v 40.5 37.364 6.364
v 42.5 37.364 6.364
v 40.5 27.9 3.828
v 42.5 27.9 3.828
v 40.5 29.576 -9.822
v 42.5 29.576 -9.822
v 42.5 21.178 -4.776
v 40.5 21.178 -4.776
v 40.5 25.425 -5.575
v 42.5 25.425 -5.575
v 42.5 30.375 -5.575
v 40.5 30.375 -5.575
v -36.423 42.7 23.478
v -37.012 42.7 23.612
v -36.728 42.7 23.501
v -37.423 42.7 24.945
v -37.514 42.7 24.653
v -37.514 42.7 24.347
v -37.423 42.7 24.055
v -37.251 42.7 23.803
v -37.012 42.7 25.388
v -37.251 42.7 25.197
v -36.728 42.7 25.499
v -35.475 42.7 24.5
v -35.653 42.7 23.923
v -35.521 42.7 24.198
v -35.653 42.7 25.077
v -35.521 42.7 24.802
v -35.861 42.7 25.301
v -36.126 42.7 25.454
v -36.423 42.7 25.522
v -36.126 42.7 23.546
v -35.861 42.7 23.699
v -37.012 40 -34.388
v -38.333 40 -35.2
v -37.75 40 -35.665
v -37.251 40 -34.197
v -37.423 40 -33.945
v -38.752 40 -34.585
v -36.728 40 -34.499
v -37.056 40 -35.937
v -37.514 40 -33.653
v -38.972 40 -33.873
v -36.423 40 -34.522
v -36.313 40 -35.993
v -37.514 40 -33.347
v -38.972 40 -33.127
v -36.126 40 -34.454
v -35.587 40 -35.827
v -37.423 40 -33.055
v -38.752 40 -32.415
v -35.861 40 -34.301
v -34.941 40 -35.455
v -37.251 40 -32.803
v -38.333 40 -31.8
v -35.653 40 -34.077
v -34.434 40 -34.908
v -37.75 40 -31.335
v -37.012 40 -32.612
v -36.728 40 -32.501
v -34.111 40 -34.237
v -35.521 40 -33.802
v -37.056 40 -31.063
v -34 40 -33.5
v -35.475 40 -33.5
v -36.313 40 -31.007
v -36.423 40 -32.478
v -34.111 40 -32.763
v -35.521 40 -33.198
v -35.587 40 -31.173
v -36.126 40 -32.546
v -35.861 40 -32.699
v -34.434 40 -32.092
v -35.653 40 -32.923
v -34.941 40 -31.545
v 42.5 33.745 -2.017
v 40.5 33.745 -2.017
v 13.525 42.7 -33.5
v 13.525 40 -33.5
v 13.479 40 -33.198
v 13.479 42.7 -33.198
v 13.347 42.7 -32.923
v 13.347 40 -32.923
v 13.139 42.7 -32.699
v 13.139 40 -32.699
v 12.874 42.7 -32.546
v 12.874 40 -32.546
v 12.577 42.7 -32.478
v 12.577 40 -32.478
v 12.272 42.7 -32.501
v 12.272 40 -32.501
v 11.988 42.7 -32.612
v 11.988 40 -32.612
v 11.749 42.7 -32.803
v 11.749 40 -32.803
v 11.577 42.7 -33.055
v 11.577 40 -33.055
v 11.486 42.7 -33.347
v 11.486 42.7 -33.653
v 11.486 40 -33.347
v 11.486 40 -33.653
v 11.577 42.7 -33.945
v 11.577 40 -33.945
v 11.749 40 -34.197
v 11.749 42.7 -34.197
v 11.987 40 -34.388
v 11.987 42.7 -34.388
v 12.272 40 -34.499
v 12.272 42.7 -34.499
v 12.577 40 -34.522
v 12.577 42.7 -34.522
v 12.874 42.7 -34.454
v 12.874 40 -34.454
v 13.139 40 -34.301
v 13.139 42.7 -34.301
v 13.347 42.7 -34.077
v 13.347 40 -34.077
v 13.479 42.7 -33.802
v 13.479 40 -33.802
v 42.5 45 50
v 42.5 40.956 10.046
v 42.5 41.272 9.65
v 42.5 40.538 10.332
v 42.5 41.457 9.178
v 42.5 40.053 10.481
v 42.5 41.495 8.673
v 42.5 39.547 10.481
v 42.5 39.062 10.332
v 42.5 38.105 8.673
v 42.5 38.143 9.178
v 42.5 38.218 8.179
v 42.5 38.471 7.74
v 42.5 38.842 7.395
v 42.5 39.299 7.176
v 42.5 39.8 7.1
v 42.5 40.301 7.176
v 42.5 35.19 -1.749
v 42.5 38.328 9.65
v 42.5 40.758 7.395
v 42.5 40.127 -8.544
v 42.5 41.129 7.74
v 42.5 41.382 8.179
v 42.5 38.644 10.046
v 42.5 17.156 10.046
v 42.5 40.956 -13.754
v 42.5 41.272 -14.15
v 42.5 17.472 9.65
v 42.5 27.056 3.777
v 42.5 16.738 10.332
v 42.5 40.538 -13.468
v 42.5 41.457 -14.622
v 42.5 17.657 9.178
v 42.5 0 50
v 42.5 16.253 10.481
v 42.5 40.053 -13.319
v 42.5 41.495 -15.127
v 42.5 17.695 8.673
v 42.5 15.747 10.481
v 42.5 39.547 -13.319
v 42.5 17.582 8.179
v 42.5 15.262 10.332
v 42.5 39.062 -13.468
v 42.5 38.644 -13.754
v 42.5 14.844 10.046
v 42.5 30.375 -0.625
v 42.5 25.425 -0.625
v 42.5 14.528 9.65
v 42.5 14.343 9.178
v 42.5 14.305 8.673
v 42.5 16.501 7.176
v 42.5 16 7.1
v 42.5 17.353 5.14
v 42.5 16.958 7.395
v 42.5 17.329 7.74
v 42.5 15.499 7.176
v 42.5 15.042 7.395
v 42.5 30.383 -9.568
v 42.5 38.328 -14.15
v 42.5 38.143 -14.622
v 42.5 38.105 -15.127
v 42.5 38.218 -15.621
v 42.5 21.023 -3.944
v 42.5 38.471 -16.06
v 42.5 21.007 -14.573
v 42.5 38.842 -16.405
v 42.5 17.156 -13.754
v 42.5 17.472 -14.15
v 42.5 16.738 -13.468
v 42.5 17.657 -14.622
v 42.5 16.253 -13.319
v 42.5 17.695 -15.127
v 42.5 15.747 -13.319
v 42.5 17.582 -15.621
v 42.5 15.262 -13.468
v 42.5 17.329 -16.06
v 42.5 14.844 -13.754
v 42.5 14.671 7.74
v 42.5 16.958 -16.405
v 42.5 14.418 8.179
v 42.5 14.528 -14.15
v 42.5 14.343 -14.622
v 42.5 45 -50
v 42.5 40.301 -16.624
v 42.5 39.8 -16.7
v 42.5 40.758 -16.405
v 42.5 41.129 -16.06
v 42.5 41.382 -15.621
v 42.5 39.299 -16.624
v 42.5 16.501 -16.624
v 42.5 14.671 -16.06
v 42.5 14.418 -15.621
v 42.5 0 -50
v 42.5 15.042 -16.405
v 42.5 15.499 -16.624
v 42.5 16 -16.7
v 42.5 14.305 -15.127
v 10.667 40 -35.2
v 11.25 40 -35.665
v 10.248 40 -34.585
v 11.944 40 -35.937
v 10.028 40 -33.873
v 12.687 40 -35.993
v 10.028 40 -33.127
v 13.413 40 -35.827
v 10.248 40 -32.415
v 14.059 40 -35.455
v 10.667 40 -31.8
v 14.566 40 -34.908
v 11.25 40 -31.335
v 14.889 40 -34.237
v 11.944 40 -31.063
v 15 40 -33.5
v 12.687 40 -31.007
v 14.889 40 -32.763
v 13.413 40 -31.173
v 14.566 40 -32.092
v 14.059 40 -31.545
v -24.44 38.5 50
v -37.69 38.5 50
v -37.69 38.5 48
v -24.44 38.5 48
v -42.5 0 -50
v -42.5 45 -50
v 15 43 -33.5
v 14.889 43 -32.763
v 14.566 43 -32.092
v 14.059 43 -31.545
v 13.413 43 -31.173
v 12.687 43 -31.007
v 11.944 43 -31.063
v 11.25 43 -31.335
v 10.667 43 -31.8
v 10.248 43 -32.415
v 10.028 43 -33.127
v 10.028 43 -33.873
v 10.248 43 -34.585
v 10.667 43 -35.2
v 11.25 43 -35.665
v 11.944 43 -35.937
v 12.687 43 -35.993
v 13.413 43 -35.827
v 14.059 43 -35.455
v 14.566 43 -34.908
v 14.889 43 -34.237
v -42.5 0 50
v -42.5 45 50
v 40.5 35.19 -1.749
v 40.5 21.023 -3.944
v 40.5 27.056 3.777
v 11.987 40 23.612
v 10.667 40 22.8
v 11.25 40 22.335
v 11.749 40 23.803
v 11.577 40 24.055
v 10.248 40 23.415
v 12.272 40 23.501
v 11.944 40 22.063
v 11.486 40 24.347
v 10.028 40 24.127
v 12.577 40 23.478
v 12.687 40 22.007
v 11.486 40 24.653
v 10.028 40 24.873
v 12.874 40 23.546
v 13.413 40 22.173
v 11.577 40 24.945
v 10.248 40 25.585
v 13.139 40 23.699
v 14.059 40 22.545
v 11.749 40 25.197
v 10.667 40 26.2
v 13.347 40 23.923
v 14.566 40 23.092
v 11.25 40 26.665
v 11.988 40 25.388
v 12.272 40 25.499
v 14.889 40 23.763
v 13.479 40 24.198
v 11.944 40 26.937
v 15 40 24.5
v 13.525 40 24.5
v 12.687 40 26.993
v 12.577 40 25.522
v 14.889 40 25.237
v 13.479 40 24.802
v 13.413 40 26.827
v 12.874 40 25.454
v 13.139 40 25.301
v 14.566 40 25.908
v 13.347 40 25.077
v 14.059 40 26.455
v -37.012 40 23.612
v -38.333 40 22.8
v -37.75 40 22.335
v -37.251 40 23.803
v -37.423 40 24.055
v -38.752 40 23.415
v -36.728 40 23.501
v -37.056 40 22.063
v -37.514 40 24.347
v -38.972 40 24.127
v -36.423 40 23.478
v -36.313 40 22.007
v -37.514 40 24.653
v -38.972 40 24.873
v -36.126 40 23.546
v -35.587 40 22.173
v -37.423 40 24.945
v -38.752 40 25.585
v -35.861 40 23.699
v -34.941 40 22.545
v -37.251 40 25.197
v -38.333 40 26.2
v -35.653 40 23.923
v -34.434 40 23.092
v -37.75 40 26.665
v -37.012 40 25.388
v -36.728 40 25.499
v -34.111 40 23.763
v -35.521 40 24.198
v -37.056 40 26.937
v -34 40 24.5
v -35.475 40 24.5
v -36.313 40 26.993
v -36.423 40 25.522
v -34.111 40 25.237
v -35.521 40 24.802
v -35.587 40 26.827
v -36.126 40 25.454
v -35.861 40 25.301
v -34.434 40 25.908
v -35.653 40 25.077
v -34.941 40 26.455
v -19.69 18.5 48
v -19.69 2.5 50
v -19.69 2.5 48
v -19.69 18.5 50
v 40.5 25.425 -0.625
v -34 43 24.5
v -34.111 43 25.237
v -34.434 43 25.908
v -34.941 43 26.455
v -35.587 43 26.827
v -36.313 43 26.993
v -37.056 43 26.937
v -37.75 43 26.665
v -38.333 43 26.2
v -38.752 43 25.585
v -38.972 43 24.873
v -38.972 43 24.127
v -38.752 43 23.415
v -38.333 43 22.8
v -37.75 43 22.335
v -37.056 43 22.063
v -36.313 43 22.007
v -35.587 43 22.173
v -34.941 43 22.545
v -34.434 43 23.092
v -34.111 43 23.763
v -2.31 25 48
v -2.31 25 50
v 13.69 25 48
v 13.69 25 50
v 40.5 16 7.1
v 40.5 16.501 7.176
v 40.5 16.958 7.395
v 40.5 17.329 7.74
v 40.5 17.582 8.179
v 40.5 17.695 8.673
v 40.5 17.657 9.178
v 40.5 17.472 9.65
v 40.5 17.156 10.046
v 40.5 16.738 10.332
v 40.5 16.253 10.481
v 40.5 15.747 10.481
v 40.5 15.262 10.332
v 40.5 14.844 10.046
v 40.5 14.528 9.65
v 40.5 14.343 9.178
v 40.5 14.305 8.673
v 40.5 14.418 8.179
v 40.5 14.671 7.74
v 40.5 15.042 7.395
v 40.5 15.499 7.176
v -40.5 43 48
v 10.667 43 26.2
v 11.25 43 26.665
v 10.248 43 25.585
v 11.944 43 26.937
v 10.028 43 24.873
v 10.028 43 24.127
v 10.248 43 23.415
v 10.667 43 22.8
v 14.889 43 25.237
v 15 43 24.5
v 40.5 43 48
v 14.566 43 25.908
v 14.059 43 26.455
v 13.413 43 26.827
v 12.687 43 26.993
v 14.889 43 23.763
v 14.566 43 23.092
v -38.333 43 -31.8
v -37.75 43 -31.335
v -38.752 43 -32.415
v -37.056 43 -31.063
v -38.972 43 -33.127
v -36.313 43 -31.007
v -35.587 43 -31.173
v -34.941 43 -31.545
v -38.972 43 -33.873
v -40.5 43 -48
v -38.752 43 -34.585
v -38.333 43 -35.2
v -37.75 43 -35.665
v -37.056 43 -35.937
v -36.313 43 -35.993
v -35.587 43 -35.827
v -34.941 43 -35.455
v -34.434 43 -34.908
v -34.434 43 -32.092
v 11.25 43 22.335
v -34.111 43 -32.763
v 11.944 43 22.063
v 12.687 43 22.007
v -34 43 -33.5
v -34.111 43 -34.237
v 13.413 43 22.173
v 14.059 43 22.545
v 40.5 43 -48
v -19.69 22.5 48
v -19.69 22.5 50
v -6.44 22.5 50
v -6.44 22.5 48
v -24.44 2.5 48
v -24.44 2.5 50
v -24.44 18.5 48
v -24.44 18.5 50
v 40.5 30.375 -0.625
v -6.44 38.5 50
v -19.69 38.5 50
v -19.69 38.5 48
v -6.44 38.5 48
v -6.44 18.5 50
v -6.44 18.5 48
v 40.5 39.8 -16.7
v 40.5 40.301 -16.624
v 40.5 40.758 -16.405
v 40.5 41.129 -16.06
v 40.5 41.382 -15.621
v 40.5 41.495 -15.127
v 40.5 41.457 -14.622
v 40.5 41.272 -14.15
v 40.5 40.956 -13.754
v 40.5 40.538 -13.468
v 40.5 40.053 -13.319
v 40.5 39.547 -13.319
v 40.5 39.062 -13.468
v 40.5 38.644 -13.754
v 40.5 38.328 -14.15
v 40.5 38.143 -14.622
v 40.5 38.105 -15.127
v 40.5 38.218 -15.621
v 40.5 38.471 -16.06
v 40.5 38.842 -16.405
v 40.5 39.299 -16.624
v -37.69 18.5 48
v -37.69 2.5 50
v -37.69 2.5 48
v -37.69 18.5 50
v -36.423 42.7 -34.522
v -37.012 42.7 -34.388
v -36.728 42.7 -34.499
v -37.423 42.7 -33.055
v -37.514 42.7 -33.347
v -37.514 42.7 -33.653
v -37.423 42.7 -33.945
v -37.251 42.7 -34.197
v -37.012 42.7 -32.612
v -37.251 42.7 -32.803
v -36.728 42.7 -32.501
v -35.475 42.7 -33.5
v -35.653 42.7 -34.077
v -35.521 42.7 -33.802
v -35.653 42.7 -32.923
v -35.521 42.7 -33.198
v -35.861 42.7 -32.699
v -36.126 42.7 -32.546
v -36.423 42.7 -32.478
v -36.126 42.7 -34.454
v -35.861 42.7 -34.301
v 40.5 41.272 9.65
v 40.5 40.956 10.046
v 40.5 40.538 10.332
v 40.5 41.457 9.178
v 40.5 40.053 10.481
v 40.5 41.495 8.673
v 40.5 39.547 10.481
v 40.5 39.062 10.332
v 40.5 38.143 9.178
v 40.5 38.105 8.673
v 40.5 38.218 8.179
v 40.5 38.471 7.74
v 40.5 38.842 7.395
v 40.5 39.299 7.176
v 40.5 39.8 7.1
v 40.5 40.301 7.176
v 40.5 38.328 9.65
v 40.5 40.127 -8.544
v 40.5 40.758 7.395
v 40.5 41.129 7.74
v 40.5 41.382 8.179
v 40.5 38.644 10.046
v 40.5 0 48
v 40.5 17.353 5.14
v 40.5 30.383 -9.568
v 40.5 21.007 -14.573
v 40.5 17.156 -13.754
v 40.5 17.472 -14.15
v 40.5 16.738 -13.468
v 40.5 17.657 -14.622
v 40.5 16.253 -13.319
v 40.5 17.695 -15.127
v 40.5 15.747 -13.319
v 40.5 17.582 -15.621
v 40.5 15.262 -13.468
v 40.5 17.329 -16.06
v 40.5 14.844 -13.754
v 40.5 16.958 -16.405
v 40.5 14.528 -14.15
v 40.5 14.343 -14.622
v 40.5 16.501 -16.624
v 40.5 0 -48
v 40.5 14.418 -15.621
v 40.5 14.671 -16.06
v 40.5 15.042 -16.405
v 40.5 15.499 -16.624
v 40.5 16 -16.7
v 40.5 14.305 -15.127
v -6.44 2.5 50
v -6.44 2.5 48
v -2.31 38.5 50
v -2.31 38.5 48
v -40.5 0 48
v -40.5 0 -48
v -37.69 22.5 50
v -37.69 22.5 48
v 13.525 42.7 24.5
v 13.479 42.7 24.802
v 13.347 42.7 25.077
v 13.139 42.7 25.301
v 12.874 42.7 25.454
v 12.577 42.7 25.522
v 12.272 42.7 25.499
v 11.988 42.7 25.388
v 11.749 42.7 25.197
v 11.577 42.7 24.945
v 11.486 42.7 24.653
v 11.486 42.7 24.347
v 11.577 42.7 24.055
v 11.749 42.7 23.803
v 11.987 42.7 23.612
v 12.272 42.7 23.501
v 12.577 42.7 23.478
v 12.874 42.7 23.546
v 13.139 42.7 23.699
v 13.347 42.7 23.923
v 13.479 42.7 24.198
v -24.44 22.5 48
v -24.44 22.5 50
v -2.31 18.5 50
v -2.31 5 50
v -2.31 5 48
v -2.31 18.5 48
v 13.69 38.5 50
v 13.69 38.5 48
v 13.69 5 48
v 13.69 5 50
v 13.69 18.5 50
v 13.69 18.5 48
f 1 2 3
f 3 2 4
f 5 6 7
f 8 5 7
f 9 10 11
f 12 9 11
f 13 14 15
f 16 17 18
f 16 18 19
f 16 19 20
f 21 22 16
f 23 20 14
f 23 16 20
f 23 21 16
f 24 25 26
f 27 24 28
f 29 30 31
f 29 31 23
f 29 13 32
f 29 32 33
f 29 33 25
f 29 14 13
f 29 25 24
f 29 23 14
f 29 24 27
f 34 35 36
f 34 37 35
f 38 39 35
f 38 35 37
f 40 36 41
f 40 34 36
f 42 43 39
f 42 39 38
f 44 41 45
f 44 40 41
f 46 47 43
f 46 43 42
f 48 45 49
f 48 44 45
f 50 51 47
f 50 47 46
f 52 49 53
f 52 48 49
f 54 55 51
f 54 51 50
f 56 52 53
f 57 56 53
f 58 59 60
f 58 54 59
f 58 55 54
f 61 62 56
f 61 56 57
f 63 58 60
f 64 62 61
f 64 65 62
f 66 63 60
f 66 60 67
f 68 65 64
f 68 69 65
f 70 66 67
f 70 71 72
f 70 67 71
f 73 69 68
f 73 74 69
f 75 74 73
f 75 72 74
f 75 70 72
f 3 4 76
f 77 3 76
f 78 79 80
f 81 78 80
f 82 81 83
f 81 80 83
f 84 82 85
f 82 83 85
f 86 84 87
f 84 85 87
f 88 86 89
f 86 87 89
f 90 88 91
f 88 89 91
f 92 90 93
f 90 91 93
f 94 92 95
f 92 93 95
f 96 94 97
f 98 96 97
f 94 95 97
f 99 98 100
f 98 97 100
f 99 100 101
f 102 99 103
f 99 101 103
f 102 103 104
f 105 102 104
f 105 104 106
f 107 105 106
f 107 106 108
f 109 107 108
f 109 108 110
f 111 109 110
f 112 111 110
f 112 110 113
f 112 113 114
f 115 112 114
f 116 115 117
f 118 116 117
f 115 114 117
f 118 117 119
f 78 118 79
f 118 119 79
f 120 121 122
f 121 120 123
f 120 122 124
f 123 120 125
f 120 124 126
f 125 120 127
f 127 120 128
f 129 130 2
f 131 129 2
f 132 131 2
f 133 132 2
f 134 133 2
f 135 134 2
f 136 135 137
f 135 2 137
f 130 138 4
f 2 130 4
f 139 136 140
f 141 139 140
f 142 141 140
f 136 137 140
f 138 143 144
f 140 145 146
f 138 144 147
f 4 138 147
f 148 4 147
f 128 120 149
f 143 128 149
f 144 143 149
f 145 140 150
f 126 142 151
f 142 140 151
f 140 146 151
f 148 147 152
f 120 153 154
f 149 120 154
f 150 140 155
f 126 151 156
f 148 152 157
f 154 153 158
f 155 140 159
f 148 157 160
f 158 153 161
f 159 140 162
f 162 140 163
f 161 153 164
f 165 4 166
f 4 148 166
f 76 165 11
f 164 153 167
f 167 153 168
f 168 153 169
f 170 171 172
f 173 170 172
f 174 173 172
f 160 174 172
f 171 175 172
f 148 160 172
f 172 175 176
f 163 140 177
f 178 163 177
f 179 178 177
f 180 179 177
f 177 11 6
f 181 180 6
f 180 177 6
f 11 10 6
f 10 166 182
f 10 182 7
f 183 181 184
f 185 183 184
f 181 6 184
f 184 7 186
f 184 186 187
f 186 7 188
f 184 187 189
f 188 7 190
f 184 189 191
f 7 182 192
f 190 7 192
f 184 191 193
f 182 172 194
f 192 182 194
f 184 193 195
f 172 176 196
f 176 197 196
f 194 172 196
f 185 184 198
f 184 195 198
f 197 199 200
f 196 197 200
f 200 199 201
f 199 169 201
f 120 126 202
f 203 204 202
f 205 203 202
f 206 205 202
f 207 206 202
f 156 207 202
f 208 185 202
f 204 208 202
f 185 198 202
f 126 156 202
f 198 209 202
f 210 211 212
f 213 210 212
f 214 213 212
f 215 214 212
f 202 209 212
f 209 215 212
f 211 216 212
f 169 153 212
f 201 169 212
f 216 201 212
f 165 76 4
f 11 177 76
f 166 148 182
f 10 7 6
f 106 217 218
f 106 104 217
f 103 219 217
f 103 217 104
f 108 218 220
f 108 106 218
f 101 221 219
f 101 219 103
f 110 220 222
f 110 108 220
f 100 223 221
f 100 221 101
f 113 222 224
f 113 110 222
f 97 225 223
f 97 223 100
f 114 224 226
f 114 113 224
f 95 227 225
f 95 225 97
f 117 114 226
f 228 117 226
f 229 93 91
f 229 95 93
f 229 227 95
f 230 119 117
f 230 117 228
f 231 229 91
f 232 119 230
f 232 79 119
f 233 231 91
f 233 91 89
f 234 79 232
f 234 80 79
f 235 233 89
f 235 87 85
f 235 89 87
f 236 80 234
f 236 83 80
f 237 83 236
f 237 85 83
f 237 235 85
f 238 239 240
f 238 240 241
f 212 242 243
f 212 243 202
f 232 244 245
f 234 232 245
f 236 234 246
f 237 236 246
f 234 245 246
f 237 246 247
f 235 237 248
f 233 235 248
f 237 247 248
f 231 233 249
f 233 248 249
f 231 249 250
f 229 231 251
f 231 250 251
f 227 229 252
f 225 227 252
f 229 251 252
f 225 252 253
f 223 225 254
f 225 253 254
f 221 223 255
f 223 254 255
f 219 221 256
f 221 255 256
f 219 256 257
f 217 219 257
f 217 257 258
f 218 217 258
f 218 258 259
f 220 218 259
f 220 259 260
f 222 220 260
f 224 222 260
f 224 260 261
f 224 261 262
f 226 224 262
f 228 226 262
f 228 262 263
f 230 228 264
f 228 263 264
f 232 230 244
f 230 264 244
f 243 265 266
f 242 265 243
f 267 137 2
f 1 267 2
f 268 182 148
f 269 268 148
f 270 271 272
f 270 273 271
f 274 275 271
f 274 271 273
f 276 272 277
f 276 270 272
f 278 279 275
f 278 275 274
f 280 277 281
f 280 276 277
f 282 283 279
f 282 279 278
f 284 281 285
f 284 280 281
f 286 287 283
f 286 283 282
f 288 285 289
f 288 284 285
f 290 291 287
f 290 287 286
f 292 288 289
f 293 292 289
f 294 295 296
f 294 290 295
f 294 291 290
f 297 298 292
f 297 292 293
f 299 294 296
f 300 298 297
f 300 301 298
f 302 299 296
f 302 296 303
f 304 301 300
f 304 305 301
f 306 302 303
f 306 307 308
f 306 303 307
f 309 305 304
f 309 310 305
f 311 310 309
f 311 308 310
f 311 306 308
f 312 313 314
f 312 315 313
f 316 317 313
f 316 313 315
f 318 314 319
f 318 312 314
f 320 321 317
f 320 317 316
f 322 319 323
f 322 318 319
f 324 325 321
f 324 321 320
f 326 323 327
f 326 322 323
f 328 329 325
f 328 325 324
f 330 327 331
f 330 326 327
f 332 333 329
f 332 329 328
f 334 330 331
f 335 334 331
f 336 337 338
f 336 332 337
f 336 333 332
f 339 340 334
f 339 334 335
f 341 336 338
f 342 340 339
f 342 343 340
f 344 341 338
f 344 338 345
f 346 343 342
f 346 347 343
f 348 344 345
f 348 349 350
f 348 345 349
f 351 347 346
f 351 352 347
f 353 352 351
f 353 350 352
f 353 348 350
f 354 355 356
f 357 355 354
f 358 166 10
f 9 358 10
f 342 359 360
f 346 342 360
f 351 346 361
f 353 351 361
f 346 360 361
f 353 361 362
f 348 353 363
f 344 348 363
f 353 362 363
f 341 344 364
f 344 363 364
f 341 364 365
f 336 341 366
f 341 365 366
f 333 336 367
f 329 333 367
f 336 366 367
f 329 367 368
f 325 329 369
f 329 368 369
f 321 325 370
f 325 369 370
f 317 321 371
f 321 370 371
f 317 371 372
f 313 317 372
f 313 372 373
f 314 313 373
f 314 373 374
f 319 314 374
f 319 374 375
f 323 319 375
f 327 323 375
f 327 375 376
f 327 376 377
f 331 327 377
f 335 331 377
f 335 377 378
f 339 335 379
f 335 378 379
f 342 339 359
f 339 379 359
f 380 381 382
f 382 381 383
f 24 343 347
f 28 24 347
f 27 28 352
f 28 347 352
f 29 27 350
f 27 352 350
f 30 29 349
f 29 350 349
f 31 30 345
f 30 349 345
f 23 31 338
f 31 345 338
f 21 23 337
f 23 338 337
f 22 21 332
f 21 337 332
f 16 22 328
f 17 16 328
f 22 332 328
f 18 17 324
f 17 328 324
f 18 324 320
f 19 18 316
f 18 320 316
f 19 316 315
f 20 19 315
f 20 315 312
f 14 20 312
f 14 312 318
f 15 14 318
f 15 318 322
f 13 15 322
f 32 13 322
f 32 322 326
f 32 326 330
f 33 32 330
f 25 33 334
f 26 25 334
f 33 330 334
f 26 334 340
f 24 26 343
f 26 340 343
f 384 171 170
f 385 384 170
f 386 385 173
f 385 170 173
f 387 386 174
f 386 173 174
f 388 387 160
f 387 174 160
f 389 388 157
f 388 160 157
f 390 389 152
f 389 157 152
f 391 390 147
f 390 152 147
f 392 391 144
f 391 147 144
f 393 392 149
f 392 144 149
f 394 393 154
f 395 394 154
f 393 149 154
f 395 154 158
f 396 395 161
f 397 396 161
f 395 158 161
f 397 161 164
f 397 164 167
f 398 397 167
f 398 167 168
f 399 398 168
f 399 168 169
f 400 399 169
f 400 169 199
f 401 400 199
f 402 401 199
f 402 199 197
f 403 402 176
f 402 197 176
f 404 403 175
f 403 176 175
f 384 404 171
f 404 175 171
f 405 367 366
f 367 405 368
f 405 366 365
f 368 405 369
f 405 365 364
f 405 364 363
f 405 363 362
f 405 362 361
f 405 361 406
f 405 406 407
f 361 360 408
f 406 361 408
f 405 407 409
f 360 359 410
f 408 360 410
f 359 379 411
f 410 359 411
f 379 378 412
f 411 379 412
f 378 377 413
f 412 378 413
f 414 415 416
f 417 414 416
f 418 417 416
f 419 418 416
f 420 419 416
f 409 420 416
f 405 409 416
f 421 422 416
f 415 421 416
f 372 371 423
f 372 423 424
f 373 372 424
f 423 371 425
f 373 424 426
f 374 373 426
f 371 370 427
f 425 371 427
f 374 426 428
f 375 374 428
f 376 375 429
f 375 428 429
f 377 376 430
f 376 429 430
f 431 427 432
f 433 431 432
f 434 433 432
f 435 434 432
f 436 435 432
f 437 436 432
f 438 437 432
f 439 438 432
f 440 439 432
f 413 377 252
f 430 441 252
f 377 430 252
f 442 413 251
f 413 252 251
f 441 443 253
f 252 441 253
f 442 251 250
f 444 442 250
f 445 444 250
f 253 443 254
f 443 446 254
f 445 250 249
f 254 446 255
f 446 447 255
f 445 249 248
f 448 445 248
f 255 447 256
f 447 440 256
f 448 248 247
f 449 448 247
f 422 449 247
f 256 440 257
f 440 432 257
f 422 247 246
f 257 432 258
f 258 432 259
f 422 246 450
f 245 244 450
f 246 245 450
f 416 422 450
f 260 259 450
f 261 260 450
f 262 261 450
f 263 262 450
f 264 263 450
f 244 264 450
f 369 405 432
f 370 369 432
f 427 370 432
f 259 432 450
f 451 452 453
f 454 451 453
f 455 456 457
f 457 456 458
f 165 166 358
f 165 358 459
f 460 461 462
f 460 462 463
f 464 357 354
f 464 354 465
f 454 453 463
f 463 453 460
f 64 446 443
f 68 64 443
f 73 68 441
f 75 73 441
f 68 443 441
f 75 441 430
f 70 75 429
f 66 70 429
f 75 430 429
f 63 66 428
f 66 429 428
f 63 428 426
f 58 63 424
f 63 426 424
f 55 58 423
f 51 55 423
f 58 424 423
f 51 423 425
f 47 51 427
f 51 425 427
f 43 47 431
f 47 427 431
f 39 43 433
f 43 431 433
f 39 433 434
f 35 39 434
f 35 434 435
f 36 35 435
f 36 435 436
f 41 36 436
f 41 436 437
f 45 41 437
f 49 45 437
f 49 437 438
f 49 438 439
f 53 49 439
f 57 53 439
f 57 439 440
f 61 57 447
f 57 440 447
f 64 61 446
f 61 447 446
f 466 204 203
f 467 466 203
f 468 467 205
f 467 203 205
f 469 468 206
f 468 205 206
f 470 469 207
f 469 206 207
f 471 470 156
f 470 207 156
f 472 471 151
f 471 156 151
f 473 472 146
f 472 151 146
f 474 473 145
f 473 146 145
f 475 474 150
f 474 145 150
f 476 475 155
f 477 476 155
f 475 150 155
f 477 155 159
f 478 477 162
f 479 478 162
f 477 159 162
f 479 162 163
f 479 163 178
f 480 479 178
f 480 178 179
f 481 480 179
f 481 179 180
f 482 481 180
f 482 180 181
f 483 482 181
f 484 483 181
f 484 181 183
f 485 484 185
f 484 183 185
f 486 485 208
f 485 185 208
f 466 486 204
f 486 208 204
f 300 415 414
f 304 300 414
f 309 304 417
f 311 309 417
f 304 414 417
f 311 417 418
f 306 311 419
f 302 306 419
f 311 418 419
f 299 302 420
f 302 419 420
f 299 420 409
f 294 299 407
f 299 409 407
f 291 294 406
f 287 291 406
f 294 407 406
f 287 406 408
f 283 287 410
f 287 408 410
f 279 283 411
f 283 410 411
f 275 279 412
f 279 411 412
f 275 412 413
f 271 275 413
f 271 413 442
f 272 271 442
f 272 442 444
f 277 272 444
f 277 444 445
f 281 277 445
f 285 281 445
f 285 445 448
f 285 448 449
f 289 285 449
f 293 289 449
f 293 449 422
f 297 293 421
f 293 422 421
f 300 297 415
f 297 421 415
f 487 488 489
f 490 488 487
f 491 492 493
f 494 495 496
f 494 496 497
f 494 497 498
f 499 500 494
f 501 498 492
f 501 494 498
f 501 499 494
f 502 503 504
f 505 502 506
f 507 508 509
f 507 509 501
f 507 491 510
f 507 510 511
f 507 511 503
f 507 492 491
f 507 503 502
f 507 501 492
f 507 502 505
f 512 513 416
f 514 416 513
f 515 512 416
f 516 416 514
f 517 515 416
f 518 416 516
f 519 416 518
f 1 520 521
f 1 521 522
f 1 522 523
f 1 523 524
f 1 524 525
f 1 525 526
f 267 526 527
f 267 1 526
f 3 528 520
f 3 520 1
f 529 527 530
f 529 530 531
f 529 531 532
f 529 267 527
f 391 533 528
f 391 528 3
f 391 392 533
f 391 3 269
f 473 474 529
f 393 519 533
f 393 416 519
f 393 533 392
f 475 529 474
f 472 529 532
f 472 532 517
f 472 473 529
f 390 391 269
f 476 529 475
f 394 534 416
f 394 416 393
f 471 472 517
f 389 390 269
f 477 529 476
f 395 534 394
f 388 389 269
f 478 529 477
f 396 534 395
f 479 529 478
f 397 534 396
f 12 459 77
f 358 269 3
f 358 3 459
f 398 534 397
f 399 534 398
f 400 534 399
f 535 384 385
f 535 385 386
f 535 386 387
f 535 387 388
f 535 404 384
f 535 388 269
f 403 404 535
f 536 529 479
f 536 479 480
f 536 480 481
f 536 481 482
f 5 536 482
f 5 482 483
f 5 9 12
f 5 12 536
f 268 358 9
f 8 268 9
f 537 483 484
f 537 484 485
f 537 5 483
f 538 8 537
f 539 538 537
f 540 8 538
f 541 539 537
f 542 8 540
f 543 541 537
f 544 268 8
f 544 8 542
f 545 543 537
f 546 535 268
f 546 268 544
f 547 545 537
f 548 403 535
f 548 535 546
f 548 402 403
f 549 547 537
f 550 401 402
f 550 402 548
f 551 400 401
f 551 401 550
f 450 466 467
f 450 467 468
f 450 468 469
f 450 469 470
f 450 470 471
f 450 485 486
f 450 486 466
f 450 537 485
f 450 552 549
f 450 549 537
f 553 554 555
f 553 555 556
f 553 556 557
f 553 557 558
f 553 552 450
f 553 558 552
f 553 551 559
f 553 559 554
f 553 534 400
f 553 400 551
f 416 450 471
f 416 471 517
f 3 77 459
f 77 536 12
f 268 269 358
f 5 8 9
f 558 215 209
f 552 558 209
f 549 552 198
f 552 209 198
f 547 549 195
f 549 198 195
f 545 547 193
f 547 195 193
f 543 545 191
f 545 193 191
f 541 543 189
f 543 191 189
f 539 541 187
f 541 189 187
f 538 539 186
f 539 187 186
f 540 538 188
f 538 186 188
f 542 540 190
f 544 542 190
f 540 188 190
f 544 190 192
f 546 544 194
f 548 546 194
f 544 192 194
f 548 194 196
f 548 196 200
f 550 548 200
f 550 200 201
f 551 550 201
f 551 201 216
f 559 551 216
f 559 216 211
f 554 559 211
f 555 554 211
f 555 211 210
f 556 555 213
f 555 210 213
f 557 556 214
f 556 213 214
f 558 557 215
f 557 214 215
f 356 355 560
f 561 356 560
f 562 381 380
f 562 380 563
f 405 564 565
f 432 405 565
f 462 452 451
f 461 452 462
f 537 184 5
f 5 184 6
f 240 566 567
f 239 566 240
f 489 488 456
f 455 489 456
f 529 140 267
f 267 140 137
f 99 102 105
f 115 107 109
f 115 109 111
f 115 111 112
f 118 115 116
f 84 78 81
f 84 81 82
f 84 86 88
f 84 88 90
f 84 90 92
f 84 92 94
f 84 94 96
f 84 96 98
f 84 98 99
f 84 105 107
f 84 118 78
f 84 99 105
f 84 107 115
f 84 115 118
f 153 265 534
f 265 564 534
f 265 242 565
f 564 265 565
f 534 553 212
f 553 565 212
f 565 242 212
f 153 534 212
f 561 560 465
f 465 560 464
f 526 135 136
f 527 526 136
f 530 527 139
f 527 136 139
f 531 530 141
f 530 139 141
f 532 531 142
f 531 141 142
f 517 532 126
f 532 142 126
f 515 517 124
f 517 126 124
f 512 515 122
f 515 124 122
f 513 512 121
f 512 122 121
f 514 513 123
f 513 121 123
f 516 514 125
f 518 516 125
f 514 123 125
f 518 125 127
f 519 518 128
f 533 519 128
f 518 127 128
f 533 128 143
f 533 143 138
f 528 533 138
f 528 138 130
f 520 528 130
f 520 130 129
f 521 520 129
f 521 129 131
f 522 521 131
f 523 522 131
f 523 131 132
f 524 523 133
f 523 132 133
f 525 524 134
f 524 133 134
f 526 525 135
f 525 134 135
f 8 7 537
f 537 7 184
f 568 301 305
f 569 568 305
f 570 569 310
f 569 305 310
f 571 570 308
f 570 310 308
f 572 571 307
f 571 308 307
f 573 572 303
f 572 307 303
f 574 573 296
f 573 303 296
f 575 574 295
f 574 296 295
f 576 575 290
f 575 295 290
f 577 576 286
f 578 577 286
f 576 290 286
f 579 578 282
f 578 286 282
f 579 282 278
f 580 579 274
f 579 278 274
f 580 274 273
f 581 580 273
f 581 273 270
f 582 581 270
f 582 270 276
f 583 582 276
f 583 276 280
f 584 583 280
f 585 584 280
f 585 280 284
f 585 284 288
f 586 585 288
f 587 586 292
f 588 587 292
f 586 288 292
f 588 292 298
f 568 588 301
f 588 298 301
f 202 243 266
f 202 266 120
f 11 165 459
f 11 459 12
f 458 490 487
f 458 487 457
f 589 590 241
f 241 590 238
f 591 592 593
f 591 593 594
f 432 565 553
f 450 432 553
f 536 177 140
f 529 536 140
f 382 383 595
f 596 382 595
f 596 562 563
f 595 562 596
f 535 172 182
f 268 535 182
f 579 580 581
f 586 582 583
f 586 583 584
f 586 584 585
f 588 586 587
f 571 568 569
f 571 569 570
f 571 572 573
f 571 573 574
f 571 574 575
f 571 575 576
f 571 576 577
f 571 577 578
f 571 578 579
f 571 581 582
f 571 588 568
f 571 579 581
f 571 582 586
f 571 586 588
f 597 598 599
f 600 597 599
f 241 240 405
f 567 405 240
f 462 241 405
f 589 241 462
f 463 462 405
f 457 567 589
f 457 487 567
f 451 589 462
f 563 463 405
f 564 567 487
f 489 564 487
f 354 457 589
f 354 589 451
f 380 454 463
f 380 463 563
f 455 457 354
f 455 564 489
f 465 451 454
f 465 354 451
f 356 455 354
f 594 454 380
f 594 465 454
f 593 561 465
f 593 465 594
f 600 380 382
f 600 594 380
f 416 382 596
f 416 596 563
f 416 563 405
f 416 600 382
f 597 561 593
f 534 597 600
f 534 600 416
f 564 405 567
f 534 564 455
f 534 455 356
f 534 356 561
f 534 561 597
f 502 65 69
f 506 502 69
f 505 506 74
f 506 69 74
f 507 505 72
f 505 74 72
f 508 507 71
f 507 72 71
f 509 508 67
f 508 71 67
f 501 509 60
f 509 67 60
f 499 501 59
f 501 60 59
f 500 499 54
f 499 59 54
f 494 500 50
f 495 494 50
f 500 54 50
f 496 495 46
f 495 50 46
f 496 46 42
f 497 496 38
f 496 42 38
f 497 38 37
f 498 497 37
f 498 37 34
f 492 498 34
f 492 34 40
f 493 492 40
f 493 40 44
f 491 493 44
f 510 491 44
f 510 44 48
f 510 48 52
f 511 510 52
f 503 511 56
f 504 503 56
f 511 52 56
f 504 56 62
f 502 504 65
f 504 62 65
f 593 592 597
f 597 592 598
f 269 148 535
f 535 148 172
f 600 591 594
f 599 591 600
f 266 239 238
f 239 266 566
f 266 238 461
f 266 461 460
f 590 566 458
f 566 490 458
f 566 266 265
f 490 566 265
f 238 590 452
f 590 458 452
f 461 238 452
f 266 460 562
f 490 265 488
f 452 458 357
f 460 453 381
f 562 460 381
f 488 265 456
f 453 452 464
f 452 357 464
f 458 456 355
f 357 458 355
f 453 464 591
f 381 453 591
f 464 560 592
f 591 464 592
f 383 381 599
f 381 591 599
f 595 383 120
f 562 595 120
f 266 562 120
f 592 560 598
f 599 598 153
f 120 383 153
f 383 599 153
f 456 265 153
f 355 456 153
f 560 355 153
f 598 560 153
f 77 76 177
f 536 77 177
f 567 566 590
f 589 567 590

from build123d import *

# Parameters (mm, degrees)
SKETCH1_W           = 85
SKETCH1_H           = 100
BOSS_EXTRUDE1_DEPTH = 45
SHELL1_T            = -2
SKETCH3_R           = 2.5
BOSS_EXTRUDE2_DEPTH = 3
SKETCH4_R           = 1.025
CUT_EXTRUDE1_DEPTH  = 2.7
SKETCH17_W          = 13.25
SKETCH17_H          = 16
SKETCH17_W_2        = 16
SKETCH17_H_2        = 13.5
CUT_EXTRUDE2_DEPTH  = 2
LPATTERN1_COUNT     = 2
LPATTERN1_PITCH     = 20
SKETCH18_R          = 1.7
CUT_EXTRUDE3_DEPTH  = 2
CUT_EXTRUDE9_DEPTH  = 10
CIRPATTERN2_COUNT   = 4
CIRPATTERN2_ANGLE   = 291
SKETCH19_4_W        = 4.949747468
SKETCH19_4_H        = 4.949747468
CUT_EXTRUDE10_DEPTH = 10


with BuildPart() as part:
    # Sketch1 → Boss-Extrude1 (new body)
    with BuildSketch(Plane(origin=(0, 0, 0), x_dir=(1, 0, 0), z_dir=(0, 1, 0))):
        Rectangle(SKETCH1_W, SKETCH1_H)
    extrude(amount=BOSS_EXTRUDE1_DEPTH)

    # Shell1
    shell1_openings = [part.faces().sort_by_distance(p)[0] for p in [
        (0, 0, 0),
    ]]
    offset(amount=SHELL1_T, openings=shell1_openings, kind=Kind.INTERSECTION)

    # Sketch3 → Boss-Extrude2 (add)
    with BuildSketch(Plane.XZ.offset(-43)):
        with Locations((-36.5, 24.5)):
            Circle(SKETCH3_R)
        with Locations((12.5, 24.5)):
            Circle(SKETCH3_R)
        with Locations((-36.5, -33.5)):
            Circle(SKETCH3_R)
        with Locations((12.5, -33.5)):
            Circle(SKETCH3_R)
    extrude(amount=BOSS_EXTRUDE2_DEPTH)

    # Sketch4 → Cut-Extrude1 (cut)
    with BuildSketch(Plane.XZ.offset(-40)):
        with Locations((12.5, 24.5)):
            Circle(SKETCH4_R)
        with Locations((-36.5, 24.5)):
            Circle(SKETCH4_R)
        with Locations((-36.5, -33.5)):
            Circle(SKETCH4_R)
        with Locations((12.5, -33.5)):
            Circle(SKETCH4_R)
    extrude(amount=-CUT_EXTRUDE1_DEPTH, mode=Mode.SUBTRACT)

    # Sketch17 → Cut-Extrude2 (cut)
    with BuildSketch(Plane.XY.offset(50)):
        with Locations((-31.065, 30.5)):
            Rectangle(SKETCH17_W, SKETCH17_H)
        with Locations((-13.065, 30.5)):
            Rectangle(SKETCH17_W, SKETCH17_H)
        with Locations((5.69, 31.75)):
            Rectangle(SKETCH17_W_2, SKETCH17_H_2)
    cut_extrude2 = extrude(amount=-CUT_EXTRUDE2_DEPTH, mode=Mode.SUBTRACT)

    # LPattern1: Cut-Extrude2 ×2
    with Locations(*[(0, -i * LPATTERN1_PITCH, 0) for i in range(1, LPATTERN1_COUNT)]):
        add(cut_extrude2, mode=Mode.SUBTRACT)

    # Sketch18 → Cut-Extrude3 (cut)
    with BuildSketch(Plane(origin=(42.5, 0, 0), x_dir=(0, 0, -1), z_dir=(1, 0, 0))):
        with Locations((15, 16)):
            Circle(SKETCH18_R)
        with Locations((-8.8, 16)):
            Circle(SKETCH18_R)
        with Locations((-8.8, 39.8)):
            Circle(SKETCH18_R)
        with Locations((15, 39.8)):
            Circle(SKETCH18_R)
    extrude(amount=-CUT_EXTRUDE3_DEPTH, mode=Mode.SUBTRACT)

    # Sketch19 → Cut-Extrude9 (cut)
    with BuildSketch(Plane(origin=(42.5, 0, 0), x_dir=(0, 0, -1), z_dir=(1, 0, 0))):
        Polygon((-6.364101615, 37.364101615), (-3.82820323, 27.9), (3.1, 34.82820323), align=None)
    cut_extrude9 = extrude(amount=-CUT_EXTRUDE9_DEPTH, mode=Mode.SUBTRACT)

    # CirPattern2: Cut-Extrude9 ×4 about axis
    cirpattern2_axis = Axis((0, 27.9, -3.1), (1, 0, 0))
    for i in range(1, CIRPATTERN2_COUNT):
        add(cut_extrude9.rotate(cirpattern2_axis, i * CIRPATTERN2_ANGLE / (CIRPATTERN2_COUNT - 1)), mode=Mode.SUBTRACT)

    # Sketch19<4> → Cut-Extrude10 (cut)
    with BuildSketch(Plane(origin=(42.5, 0, 0), x_dir=(0, 0, -1), z_dir=(1, 0, 0))):
        with Locations((3.1, 27.9)):
            Rectangle(SKETCH19_4_W, SKETCH19_4_H)
    extrude(amount=-CUT_EXTRUDE10_DEPTH, mode=Mode.SUBTRACT)


solid = part.part
